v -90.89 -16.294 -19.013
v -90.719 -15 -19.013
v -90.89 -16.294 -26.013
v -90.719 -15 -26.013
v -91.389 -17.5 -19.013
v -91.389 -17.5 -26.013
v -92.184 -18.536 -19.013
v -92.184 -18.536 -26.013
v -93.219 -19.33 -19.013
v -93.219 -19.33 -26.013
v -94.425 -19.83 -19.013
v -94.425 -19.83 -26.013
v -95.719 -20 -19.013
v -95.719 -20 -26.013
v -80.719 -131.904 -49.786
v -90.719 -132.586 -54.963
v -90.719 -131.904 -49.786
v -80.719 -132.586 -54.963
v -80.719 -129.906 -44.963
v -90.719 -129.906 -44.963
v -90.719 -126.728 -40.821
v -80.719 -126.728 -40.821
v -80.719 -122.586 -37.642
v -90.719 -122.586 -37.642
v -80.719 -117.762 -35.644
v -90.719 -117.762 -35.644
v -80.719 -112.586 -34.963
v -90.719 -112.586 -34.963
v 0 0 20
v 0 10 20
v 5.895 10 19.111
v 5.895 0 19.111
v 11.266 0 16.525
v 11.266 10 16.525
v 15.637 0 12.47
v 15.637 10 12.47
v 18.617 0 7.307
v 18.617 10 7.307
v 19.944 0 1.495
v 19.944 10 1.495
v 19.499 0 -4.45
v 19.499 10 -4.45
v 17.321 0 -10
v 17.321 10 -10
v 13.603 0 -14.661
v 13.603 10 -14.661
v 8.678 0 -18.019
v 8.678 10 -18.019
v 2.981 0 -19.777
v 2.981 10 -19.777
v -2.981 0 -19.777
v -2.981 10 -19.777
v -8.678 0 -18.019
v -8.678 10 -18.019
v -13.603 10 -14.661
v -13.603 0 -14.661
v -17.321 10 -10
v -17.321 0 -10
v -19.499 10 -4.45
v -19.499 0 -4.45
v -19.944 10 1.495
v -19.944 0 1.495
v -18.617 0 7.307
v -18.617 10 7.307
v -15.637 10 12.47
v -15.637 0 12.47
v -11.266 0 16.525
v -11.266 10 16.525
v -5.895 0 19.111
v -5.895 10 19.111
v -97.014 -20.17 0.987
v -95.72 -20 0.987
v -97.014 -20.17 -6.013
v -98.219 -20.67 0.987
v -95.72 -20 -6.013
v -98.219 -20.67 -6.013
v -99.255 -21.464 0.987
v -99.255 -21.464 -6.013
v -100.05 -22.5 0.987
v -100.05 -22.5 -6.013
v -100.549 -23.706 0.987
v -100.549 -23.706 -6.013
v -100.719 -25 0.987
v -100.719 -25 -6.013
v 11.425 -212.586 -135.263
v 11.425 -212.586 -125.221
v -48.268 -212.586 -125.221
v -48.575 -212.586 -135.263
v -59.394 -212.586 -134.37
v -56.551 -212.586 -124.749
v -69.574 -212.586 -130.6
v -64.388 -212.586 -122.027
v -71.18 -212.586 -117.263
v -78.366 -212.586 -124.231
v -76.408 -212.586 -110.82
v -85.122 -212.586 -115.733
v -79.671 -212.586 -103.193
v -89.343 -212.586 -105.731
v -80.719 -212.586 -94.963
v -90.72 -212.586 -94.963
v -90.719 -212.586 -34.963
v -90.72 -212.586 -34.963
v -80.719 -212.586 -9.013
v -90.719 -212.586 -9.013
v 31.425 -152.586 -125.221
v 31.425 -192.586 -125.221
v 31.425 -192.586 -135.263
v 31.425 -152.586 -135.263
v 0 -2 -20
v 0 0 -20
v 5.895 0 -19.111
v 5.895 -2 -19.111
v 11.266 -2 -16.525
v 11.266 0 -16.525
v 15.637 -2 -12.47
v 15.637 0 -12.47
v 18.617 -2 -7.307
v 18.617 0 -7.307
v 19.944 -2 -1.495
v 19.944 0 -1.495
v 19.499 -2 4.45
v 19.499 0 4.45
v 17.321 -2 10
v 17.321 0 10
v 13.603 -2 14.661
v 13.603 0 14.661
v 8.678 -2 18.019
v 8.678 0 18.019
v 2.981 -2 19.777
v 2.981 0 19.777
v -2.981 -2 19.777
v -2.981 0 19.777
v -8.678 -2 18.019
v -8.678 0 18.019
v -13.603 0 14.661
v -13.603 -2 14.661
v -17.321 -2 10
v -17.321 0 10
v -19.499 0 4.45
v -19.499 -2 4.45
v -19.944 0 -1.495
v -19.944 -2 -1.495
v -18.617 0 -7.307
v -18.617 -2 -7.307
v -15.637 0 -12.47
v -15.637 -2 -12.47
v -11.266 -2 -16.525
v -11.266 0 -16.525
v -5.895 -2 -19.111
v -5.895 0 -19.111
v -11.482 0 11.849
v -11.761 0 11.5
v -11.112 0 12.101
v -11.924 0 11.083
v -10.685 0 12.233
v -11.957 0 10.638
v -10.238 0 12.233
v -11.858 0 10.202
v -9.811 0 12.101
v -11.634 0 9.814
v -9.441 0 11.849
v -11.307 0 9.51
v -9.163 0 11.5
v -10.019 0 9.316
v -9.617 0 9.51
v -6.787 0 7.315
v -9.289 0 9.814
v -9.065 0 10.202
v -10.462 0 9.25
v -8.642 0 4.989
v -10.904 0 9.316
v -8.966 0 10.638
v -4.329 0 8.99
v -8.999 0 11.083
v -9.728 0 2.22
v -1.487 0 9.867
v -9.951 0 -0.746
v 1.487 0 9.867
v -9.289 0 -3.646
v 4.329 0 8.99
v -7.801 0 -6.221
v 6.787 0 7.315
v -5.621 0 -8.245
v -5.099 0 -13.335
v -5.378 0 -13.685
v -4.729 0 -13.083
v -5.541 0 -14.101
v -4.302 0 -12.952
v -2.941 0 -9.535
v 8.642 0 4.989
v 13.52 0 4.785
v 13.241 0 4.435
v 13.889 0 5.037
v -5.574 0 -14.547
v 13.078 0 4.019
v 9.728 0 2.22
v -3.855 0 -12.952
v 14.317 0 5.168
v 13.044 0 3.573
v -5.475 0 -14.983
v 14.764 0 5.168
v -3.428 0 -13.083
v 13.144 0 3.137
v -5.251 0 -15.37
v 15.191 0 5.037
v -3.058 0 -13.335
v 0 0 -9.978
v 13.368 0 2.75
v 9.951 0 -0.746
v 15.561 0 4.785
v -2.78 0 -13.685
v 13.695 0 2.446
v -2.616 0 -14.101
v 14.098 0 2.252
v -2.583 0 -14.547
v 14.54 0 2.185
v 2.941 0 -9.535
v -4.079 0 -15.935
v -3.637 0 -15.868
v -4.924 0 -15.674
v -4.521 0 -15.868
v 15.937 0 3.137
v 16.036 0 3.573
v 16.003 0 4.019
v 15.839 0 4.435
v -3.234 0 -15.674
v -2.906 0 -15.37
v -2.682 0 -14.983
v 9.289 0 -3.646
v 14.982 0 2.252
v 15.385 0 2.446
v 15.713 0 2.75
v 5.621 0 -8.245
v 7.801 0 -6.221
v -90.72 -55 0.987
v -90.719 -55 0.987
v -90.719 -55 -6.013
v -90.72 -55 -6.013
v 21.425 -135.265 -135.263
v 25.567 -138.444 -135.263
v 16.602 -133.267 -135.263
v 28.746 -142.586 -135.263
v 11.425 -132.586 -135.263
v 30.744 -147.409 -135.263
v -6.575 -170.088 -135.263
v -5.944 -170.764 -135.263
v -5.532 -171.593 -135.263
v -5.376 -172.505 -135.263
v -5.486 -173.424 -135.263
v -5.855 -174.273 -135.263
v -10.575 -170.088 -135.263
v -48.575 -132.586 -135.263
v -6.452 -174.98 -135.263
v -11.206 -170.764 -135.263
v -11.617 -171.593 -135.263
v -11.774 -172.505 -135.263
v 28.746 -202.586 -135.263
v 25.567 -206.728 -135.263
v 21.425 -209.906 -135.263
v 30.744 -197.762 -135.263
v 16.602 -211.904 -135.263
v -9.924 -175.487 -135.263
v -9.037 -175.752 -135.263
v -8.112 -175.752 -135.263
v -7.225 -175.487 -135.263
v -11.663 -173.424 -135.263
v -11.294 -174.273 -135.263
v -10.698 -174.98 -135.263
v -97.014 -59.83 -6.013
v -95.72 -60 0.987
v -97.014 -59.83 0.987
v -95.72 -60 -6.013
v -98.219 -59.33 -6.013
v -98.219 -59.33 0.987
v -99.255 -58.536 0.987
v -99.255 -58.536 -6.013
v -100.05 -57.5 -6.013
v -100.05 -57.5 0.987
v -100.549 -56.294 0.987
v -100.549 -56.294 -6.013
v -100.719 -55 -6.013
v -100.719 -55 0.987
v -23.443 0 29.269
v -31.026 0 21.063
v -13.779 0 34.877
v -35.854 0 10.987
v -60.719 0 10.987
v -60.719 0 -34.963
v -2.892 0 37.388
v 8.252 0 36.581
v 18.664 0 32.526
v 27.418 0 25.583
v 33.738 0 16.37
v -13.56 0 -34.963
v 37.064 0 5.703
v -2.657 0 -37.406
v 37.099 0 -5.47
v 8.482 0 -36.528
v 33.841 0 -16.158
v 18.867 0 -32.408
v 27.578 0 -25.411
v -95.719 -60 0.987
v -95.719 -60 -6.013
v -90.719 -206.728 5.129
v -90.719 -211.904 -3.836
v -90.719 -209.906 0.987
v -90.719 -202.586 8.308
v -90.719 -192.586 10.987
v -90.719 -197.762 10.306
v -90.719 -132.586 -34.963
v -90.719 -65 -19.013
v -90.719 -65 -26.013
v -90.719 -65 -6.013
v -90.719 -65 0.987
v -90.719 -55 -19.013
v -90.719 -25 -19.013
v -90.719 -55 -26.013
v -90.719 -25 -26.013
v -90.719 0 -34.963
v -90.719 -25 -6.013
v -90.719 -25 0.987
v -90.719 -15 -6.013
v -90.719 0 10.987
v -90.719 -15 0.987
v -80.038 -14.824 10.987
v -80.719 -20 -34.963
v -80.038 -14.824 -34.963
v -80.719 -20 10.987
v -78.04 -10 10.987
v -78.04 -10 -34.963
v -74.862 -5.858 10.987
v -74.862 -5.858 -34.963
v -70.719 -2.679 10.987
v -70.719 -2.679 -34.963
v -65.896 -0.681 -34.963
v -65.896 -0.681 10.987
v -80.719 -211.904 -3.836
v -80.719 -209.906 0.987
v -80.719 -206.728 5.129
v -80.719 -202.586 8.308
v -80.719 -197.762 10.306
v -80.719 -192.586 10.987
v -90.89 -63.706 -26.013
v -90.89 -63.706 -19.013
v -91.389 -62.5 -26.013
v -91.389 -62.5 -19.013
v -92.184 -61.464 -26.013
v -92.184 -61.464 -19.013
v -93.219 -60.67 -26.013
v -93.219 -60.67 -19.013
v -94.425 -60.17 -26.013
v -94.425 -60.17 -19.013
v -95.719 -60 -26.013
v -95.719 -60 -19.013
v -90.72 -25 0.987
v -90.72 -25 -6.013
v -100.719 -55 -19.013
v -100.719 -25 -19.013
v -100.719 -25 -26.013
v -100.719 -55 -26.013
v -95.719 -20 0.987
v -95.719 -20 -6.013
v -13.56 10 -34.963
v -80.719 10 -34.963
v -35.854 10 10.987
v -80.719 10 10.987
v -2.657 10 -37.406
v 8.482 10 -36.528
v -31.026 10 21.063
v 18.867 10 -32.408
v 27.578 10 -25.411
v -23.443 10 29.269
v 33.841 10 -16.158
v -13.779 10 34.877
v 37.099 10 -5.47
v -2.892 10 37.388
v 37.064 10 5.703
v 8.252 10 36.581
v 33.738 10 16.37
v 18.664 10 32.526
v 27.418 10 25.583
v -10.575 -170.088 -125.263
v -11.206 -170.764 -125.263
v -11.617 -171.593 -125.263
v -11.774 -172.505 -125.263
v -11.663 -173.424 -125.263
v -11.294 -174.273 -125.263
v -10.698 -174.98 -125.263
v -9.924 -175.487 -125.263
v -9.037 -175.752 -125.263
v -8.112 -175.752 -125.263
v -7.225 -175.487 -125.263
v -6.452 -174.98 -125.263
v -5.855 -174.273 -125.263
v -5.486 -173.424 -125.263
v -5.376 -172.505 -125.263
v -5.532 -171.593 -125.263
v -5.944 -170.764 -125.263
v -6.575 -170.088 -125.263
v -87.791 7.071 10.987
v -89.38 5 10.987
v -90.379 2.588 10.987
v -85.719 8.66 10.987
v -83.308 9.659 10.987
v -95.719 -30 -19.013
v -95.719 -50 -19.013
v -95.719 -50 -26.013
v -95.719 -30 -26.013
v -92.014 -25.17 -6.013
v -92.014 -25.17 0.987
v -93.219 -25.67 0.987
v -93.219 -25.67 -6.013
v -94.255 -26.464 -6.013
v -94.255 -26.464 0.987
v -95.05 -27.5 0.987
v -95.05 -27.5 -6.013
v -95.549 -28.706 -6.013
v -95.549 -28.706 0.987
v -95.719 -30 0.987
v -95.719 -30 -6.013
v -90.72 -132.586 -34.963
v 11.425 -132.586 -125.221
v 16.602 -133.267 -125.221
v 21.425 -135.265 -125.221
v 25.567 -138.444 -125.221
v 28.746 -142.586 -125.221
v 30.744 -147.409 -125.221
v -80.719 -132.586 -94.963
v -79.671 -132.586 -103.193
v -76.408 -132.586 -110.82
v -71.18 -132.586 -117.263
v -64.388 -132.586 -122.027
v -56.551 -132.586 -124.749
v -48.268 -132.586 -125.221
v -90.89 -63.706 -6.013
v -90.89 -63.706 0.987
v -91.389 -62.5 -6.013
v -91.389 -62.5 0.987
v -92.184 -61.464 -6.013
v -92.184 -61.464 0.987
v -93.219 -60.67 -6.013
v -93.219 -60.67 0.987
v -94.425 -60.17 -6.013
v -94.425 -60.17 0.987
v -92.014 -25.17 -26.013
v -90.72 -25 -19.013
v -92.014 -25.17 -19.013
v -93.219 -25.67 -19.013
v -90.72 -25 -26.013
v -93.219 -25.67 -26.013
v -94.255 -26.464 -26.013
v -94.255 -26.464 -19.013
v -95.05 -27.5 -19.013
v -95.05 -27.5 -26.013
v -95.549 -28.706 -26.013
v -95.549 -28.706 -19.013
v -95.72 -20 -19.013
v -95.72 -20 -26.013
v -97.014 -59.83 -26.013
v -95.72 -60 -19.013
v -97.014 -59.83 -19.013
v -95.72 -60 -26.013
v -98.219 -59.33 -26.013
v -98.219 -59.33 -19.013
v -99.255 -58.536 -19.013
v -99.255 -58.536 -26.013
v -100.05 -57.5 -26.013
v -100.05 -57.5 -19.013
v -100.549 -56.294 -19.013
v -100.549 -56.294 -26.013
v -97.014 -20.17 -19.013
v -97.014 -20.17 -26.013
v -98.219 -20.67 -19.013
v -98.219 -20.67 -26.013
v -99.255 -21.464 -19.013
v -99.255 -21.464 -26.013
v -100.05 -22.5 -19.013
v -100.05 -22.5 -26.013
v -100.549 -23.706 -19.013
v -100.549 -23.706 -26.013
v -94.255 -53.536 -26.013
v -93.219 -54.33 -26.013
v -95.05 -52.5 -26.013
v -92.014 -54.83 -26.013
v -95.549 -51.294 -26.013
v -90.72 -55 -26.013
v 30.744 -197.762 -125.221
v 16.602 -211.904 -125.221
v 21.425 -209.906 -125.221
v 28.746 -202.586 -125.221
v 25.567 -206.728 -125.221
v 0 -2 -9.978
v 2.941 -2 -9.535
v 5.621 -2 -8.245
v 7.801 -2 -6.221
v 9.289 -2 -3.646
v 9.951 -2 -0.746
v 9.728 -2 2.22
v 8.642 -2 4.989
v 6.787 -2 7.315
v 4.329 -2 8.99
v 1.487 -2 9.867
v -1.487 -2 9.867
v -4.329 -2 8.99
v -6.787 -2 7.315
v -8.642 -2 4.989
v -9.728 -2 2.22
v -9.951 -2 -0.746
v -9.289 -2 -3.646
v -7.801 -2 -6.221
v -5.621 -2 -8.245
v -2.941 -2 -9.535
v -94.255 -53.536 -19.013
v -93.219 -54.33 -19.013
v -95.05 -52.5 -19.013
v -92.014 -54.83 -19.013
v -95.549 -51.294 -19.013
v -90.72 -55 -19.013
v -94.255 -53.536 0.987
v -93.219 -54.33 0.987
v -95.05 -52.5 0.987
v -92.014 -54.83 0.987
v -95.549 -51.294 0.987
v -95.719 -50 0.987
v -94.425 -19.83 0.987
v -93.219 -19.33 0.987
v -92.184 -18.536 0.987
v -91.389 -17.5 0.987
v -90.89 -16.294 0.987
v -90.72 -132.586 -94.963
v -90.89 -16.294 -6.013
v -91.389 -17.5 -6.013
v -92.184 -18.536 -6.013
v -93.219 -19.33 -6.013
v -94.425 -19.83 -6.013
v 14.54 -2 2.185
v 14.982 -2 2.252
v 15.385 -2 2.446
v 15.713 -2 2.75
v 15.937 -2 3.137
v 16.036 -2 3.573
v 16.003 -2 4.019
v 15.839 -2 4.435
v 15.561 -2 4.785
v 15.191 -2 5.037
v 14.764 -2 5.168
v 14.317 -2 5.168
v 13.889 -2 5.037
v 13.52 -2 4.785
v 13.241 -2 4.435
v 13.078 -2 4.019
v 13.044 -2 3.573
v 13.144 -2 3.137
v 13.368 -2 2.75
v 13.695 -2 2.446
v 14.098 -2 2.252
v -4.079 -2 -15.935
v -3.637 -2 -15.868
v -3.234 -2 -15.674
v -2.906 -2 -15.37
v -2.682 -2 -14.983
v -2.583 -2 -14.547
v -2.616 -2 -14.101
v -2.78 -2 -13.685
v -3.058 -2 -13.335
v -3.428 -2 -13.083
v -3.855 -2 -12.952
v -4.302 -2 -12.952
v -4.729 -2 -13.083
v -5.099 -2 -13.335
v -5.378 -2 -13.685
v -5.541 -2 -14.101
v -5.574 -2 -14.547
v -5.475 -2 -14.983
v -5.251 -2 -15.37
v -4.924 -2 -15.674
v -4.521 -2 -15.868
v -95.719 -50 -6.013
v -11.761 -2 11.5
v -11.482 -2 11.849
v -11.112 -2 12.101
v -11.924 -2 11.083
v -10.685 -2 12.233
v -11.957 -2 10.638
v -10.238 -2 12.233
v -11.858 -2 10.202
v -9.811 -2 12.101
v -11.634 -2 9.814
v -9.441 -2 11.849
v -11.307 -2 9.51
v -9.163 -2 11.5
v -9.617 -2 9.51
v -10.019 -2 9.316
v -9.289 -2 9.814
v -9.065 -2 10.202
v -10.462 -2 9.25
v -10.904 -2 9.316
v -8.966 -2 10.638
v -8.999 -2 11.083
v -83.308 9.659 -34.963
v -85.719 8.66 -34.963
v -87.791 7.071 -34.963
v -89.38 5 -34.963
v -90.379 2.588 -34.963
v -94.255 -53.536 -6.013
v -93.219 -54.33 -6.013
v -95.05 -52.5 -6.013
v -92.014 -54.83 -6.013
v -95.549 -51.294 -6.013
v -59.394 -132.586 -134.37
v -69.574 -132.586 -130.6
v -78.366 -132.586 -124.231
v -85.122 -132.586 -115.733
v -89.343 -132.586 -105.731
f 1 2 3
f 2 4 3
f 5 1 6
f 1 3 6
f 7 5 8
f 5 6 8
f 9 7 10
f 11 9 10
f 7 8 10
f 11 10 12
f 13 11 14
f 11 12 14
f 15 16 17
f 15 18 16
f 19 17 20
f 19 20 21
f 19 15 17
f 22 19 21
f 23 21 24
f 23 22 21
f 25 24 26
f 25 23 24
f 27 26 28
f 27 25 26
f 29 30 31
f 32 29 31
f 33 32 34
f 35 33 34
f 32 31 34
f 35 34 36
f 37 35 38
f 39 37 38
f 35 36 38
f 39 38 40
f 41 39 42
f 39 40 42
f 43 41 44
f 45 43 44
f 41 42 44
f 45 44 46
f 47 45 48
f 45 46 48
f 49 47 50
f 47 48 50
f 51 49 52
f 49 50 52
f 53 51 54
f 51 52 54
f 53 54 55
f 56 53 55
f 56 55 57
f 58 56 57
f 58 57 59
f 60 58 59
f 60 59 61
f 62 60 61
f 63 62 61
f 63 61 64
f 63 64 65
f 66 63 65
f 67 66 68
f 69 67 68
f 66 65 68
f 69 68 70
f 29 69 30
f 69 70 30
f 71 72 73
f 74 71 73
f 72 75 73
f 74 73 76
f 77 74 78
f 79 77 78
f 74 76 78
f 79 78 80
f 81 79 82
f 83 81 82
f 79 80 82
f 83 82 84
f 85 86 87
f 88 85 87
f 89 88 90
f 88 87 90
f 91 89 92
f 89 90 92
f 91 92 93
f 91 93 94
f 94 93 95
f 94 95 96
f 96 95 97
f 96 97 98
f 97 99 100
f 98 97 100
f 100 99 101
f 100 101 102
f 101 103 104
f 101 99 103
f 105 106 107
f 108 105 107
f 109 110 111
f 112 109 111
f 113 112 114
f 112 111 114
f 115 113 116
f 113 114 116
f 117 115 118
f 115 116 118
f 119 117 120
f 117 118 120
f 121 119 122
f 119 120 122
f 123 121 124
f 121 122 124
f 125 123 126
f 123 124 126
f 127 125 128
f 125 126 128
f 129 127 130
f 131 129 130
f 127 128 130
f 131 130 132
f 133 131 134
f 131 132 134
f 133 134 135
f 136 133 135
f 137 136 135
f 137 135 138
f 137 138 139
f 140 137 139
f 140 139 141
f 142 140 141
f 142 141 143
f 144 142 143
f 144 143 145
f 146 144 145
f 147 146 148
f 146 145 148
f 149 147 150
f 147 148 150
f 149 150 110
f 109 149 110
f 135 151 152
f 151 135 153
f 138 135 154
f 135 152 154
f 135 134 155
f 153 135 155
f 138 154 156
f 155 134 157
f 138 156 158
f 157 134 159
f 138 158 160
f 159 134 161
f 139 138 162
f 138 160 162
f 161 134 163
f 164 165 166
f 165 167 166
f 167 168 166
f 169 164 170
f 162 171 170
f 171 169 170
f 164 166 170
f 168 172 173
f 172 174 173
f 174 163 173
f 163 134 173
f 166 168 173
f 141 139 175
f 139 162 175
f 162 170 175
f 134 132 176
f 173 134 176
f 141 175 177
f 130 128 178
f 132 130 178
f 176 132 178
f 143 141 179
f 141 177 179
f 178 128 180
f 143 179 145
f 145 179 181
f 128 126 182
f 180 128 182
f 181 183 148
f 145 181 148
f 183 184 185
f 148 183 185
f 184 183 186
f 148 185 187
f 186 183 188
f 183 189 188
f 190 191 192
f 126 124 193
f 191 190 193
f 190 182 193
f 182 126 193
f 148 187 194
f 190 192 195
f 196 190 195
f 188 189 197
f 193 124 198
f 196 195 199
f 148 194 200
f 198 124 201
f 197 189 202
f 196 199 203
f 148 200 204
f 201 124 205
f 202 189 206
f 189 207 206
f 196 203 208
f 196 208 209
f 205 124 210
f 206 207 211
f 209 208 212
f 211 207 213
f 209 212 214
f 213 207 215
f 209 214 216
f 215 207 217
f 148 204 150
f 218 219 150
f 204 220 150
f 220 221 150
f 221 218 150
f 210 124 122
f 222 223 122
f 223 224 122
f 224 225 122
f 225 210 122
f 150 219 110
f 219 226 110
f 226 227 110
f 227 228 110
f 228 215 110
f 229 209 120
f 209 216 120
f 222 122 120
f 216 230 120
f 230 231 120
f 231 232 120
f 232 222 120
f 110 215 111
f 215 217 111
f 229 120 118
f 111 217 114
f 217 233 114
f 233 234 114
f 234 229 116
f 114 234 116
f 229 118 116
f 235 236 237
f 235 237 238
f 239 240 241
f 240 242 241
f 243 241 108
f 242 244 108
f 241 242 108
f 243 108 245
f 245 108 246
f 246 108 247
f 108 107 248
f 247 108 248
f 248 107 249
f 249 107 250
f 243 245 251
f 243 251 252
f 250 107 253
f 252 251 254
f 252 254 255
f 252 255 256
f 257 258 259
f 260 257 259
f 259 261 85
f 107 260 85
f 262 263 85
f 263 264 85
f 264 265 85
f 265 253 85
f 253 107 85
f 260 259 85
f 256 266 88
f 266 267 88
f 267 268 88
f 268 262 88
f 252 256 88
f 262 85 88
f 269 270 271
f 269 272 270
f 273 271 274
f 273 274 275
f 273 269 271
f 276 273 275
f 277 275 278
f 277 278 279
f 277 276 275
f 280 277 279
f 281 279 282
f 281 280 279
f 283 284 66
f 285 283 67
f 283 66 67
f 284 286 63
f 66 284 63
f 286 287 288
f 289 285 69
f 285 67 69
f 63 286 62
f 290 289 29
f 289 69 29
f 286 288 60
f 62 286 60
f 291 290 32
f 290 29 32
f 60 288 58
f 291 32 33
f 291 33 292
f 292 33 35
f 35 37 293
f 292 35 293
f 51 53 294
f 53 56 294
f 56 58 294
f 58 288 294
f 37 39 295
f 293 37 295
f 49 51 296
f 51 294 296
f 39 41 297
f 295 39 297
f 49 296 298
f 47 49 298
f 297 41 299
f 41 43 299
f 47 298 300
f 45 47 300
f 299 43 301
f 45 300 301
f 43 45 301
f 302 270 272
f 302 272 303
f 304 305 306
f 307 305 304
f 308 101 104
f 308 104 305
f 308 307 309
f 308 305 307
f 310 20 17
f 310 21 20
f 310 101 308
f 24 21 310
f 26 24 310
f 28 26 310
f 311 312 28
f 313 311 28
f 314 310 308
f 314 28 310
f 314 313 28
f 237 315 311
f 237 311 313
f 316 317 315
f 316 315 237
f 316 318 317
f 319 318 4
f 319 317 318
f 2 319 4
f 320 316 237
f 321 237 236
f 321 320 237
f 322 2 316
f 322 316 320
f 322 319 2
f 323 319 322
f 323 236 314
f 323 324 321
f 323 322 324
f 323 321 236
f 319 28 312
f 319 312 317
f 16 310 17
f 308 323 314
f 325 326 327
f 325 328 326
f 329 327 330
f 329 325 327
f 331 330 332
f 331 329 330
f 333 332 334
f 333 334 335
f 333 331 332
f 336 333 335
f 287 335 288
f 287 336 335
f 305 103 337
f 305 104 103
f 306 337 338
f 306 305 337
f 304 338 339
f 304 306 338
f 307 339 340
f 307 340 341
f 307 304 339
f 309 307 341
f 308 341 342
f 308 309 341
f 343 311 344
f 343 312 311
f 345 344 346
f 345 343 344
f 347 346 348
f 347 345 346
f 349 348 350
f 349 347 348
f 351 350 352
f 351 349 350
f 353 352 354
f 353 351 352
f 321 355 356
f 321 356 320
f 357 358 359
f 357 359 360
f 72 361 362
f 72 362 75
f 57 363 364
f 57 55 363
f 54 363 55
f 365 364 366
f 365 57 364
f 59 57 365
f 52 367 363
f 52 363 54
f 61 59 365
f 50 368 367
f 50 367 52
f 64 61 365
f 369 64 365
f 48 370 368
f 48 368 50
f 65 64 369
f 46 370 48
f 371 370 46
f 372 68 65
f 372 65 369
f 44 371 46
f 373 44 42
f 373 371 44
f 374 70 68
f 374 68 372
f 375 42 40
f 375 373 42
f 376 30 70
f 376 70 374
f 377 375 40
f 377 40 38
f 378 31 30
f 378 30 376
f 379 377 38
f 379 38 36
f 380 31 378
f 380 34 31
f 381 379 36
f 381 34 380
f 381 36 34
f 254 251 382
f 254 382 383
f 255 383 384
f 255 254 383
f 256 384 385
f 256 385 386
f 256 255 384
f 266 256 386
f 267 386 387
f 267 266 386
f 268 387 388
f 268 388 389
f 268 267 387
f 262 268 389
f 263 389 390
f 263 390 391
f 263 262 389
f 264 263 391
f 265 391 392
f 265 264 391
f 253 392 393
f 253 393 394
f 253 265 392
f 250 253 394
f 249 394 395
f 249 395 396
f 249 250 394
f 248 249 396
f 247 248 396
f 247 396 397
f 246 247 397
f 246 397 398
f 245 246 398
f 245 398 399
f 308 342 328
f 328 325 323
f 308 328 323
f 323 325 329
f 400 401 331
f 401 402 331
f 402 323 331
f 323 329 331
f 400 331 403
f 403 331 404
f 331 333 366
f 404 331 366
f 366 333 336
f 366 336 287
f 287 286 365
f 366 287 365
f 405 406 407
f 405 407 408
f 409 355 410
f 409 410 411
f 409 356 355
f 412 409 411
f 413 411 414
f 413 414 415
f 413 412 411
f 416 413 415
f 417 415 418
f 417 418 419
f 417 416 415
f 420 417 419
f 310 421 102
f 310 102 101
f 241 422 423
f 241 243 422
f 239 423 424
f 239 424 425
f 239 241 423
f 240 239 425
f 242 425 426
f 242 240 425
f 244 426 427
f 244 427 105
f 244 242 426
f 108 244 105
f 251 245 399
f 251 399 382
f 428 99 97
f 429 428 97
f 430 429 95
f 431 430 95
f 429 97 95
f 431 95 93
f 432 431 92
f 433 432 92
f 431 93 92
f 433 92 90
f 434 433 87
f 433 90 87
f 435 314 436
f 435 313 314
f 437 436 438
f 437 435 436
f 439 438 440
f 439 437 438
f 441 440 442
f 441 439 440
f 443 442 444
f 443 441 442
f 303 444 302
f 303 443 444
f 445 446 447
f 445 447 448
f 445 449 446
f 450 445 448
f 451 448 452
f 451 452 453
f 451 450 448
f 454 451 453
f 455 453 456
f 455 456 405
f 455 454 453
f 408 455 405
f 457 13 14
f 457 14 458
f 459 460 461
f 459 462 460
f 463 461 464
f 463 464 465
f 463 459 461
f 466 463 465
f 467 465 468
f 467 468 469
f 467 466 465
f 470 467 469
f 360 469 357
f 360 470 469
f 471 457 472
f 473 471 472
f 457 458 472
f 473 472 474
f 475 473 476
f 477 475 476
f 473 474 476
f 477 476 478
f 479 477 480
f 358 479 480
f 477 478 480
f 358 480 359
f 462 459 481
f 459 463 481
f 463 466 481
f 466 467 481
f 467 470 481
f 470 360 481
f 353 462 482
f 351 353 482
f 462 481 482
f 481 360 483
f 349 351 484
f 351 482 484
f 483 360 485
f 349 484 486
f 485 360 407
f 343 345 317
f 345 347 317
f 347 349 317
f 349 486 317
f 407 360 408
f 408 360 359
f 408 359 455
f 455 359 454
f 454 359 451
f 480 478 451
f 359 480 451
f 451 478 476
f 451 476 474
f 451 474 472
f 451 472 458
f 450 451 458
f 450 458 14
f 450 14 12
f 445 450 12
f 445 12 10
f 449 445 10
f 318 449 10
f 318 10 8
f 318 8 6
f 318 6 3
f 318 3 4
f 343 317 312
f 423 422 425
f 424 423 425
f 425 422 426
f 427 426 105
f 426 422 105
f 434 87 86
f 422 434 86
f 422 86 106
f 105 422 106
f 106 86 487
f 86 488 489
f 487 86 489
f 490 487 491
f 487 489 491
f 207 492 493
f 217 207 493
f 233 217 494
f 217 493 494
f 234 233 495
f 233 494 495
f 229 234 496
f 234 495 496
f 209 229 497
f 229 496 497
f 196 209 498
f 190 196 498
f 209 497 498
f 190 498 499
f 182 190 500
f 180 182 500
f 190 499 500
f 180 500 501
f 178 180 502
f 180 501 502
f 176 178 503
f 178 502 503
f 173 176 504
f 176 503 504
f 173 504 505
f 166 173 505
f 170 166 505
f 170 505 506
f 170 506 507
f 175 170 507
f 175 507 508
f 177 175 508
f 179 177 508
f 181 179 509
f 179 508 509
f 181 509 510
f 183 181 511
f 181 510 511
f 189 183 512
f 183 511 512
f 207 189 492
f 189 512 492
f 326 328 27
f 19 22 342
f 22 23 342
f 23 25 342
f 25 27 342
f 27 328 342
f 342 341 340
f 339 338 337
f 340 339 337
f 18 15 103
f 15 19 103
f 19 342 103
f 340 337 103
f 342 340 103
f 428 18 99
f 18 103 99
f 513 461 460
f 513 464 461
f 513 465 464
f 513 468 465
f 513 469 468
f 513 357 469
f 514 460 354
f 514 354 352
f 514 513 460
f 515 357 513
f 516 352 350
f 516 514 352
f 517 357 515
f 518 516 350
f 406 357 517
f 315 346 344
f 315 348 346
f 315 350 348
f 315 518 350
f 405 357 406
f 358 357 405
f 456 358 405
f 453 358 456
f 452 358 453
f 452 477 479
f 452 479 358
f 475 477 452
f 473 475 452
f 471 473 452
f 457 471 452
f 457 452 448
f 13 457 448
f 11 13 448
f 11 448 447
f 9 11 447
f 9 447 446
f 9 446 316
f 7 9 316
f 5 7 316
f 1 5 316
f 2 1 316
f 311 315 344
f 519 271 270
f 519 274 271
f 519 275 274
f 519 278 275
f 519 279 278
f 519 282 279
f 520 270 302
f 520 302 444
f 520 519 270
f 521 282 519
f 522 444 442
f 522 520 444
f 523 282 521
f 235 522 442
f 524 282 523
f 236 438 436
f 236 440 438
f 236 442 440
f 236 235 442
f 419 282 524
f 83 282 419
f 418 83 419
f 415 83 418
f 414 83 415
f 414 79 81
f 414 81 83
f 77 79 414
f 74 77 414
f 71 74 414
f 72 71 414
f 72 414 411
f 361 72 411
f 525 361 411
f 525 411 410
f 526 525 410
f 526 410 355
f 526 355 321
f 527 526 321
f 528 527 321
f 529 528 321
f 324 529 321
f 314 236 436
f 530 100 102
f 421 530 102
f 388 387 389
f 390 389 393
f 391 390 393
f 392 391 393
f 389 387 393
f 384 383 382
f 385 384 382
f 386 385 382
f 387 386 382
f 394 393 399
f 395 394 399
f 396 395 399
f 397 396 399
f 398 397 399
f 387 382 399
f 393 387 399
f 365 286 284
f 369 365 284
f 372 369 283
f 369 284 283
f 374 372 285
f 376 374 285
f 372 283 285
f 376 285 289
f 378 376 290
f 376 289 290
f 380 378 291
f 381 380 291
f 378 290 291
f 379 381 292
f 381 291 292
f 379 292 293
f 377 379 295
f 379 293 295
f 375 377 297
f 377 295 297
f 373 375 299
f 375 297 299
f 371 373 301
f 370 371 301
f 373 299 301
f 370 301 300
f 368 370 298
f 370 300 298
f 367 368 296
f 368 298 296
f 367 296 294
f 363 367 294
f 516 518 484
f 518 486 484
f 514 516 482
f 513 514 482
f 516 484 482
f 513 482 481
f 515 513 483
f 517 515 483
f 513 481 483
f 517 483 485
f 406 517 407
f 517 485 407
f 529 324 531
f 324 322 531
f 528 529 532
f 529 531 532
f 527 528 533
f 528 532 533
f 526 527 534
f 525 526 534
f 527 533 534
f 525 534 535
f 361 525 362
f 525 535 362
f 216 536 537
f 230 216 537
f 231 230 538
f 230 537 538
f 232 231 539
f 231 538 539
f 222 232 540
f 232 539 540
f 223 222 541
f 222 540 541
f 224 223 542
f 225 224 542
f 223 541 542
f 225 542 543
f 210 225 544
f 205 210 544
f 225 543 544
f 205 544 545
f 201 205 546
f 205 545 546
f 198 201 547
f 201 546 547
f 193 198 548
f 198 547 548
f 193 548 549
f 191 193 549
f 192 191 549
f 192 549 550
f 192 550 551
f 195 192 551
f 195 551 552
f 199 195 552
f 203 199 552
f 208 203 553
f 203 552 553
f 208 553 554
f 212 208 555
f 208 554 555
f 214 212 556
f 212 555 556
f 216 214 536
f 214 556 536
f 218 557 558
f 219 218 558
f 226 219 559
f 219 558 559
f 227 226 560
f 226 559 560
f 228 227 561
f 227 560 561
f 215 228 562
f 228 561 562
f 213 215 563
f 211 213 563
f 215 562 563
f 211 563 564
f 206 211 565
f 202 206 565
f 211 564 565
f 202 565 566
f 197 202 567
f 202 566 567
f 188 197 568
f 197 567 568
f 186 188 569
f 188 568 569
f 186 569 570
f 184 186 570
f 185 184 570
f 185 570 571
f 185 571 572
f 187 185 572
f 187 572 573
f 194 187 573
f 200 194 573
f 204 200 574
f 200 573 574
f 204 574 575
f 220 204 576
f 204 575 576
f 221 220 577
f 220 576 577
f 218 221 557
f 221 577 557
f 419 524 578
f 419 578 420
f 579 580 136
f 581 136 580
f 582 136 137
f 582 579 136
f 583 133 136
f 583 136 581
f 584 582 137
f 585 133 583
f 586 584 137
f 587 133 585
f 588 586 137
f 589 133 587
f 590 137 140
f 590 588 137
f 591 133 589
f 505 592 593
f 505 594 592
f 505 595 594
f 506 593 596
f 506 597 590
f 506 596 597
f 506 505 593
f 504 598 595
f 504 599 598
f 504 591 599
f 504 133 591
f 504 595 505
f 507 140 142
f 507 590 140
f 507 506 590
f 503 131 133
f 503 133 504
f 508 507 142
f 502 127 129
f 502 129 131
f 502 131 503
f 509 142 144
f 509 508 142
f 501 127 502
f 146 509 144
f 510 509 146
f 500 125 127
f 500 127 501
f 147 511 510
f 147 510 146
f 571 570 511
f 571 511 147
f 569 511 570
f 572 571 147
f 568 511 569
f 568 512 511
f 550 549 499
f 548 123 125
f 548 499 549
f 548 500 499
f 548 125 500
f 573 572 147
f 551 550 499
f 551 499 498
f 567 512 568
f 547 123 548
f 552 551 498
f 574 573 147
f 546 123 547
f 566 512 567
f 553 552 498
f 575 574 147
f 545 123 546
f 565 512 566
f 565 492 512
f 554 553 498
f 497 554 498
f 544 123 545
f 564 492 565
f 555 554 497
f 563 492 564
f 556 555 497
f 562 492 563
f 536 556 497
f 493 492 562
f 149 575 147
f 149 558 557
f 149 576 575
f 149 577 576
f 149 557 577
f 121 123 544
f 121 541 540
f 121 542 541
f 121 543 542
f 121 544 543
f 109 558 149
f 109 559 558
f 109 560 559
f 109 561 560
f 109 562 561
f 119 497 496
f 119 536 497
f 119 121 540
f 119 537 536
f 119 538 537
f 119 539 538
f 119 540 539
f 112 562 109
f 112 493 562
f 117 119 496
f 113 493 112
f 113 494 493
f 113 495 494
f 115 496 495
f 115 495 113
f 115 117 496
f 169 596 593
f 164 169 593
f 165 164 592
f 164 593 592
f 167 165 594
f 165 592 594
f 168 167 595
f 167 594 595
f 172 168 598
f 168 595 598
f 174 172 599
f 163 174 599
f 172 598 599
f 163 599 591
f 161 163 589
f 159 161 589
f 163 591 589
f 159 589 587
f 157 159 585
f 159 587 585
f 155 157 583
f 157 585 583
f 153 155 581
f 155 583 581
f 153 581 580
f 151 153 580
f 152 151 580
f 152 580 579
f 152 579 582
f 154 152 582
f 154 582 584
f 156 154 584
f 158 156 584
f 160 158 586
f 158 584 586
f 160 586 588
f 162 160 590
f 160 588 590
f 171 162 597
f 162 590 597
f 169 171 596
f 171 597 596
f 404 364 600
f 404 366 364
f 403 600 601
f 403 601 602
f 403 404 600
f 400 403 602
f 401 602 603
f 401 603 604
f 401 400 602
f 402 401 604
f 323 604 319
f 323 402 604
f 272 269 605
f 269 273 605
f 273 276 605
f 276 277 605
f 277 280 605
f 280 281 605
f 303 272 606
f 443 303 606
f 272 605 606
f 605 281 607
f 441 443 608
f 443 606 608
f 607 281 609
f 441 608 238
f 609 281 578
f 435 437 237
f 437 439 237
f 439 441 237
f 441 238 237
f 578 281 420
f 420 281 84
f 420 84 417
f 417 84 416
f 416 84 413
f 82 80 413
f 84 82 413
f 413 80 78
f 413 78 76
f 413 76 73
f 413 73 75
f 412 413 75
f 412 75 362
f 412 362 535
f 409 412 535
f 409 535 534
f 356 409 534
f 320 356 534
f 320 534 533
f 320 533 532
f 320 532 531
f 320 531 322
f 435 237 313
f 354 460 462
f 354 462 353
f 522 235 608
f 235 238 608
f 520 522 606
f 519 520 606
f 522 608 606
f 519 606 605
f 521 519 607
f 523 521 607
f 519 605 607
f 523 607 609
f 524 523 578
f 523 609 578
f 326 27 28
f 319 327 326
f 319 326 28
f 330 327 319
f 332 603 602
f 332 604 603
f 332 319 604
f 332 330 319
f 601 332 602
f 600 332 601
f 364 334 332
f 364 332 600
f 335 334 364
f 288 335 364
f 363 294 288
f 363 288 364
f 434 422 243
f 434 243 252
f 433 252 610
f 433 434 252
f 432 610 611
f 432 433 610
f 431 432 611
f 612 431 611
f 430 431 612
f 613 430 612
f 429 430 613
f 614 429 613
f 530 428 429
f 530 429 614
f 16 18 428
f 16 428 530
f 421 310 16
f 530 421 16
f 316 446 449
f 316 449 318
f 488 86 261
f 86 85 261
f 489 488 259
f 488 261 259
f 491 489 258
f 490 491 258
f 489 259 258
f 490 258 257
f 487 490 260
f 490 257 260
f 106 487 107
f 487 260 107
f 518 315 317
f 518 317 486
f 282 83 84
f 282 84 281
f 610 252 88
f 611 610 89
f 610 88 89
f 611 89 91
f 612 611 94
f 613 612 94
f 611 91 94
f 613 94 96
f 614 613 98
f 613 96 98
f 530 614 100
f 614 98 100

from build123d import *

# Parameters (mm, degrees)
ESQUISSE3_R                = 37.5
BOSS_EXTRU_1_DEPTH         = 10
ESQUISSE4_R                = 20
ENL_V_MAT_EXTRU_1_DEPTH    = 10
ESQUISSE7_W                = 45.949997051
ESQUISSE7_H                = 222.585817195
BOSS_EXTRU_2_DEPTH         = 10
CONG_1_R                   = 10
BOSS_EXTRU_3_DEPTH         = 80
CONG_2_R                   = 20
ENL_V_MAT_EXTRU_2_DEPTH    = 10
BOSS_EXTRU_4_START         = -10
BOSS_EXTRU_4_DEPTH         = 7
CONG_3_R                   = 5
R_P_TITION_LIN_AIRE1_COUNT = 2
R_P_TITION_LIN_AIRE1_PITCH = 20
CONG_4_R                   = 5
ESQUISSE14_R               = 20
BOSS_EXTRU_5_DEPTH         = 2
ESQUISSE17_R               = 9.978403452
ESQUISSE17_R_2             = 1.5
ENL_V_MAT_EXTRU_9_DEPTH    = 2


with BuildPart() as part:
    # Esquisse3 → Boss.-Extru.1 (new body)
    with BuildSketch(Plane(origin=(0, 0, 0), x_dir=(1, 0, 0), z_dir=(0, 1, 0))):
        with BuildLine():
            Line((-13.559611376, 34.962650634), (-80.71943609, 34.962650634))
            Line((-80.71943609, 34.962650634), (-80.71943609, -10.987346417))
            Line((-80.71943609, -10.987346417), (-35.854263606, -10.987346417))
            ThreePointArc((-35.854263606, -10.987346417), (-33.73845458, 16.36968792), (-13.559611376, 34.962650634))
        make_face()
        Circle(ESQUISSE3_R)
    extrude(amount=BOSS_EXTRU_1_DEPTH)

    # Esquisse4 → Enlèv. mat.-Extru.1 (cut)
    with BuildSketch(Plane(origin=(0, 10, 0), x_dir=(1, 0, 0), z_dir=(0, 1, 0))):
        with Locations(Location((0, 0, 0), (0, 0, 270))):
            Circle(ESQUISSE4_R)
    extrude(amount=-ENL_V_MAT_EXTRU_1_DEPTH, mode=Mode.SUBTRACT)

    # Esquisse7 → Boss.-Extru.2 (add)
    with BuildSketch(Plane.ZY.offset(80.71943609)):
        with Locations((-11.987652108, -101.292908598)):
            Rectangle(ESQUISSE7_W, ESQUISSE7_H)
    extrude(amount=BOSS_EXTRU_2_DEPTH)

    # Congé1
    cong_1_edges = [part.edges().sort_by_distance(p)[0] for p in [
        (-90.71943609, 10, -11.987652108),
    ]]
    fillet(cong_1_edges, radius=CONG_1_R)

    # Esquisse8 → Boss.-Extru.3 (add)
    with BuildSketch(Plane.XZ.offset(212.585817195)):
        with BuildLine():
            Line((-80.71943609, -34.962650634), (-80.71943609, -94.962650634))
            ThreePointArc((-80.71943609, -94.962650634), (-71.180307706, -117.262901723), (-48.268076901, -125.220655707))
            Line((-48.268076901, -125.220655707), (31.425291459, -125.220655707))
            Line((31.425291459, -125.220655707), (31.425291459, -135.263497175))
            Line((31.425291459, -135.263497175), (-48.574708541, -135.263497175))
            ThreePointArc((-48.574708541, -135.263497175), (-78.366180233, -124.230942217), (-90.719971648, -94.962650634))
            Line((-90.719971648, -94.962650634), (-90.719971648, -34.962650634))
            Line((-90.719971648, -34.962650634), (-80.71943609, -34.962650634))
        make_face()
    extrude(amount=-BOSS_EXTRU_3_DEPTH)

    # Congé2
    cong_2_edges = [part.edges().sort_by_distance(p)[0] for p in [
        (-85.71943609, -212.585817195, 10.987346417),
        (-85.71943609, -132.585817195, -34.962650634),
        (31.425291459, -132.585817195, -130.242076441),
        (31.425291459, -212.585817195, -130.242076441),
        (-80.71943609, 0, -11.987652108),
    ]]
    fillet(cong_2_edges, radius=CONG_2_R)

    # Esquisse9 → Enlèv. mat.-Extru.2 (cut)
    with BuildSketch(Plane(origin=(0, 0, -135.263497175), x_dir=(-1, 0, 0), z_dir=(0, 0, -1))):
        with BuildLine():
            Line((6.574708541, -170.087817995), (10.574708541, -170.087817995))
            ThreePointArc((10.574708541, -170.087817995), (8.574708541, -175.785817195), (6.574708541, -170.087817995))
        make_face()
    extrude(amount=-ENL_V_MAT_EXTRU_2_DEPTH, mode=Mode.SUBTRACT)

    # Esquisse13 → Boss.-Extru.4 (add)
    with BuildSketch(Plane.XY.offset(10.987346417).offset(BOSS_EXTRU_4_START)):
        Polygon((-90.71943609, -20), (-100.71943609, -20), (-100.71943609, -60), (-90.71943609, -60), (-90.71943609, -55), (-95.71943609, -55), (-95.71943609, -25), (-90.71943609, -25), align=None)
    boss_extru_4 = extrude(amount=-BOSS_EXTRU_4_DEPTH)

    # Congé3
    cong_3_edges = [part.edges().sort_by_distance(p)[0] for p in [
        (-95.71943609, -25, -2.512653583),
        (-95.71943609, -55, -2.512653583),
        (-90.71943609, -60, -2.512653583),
        (-90.71943609, -20, -2.512653583),
        (-100.71943609, -60, -2.512653583),
        (-100.71943609, -20, -2.512653583),
    ]]
    fillet(cong_3_edges, radius=CONG_3_R - 0.0001)  # a hair under: the kernel refuses the full size

    # Répétition linéaire1: Boss.-Extru.4 ×2
    with Locations(*[(0, 0, -i * R_P_TITION_LIN_AIRE1_PITCH) for i in range(1, R_P_TITION_LIN_AIRE1_COUNT)]):
        add(boss_extru_4)

    # Congé4
    cong_4_edges = [part.edges().sort_by_distance(p)[0] for p in [
        (-95.71943609, -55, -22.512653583),
        (-95.71943609, -25, -22.512653583),
        (-90.71943609, -20, -22.512653583),
        (-100.71943609, -20, -22.512653583),
        (-90.71943609, -60, -22.512653583),
        (-100.71943609, -60, -22.512653583),
    ]]
    fillet(cong_4_edges, radius=CONG_4_R - 0.0001)  # a hair under: the kernel refuses the full size


with BuildPart() as body_2:
    # Esquisse14 → Boss.-Extru.5 (new body)
    with BuildSketch(Plane.XZ):
        with Locations(Location((0, 0, 0), (0, 0, 270))):
            Circle(ESQUISSE14_R)
    extrude(amount=BOSS_EXTRU_5_DEPTH)

    # Esquisse17 → Enlèv. mat.-Extru.9 (cut)
    with BuildSketch(Plane.XZ.offset(2)):
        with Locations(Location((0, 0, 0), (0, 0, 270))):
            Circle(ESQUISSE17_R)
        with Locations(Location((14.540266373, 3.685193863, 0), (0, 0, 270))):
            Circle(ESQUISSE17_R_2)
        with Locations(Location((-10.461604689, 10.749643125, 0), (0, 0, 270))):
            Circle(ESQUISSE17_R_2)
        with Locations(Location((-4.078661683, -14.434836988, 0), (0, 0, 270))):
            Circle(ESQUISSE17_R_2)
    extrude(amount=-ENL_V_MAT_EXTRU_9_DEPTH, mode=Mode.SUBTRACT)


solid = Compound([part.part, body_2.part])
